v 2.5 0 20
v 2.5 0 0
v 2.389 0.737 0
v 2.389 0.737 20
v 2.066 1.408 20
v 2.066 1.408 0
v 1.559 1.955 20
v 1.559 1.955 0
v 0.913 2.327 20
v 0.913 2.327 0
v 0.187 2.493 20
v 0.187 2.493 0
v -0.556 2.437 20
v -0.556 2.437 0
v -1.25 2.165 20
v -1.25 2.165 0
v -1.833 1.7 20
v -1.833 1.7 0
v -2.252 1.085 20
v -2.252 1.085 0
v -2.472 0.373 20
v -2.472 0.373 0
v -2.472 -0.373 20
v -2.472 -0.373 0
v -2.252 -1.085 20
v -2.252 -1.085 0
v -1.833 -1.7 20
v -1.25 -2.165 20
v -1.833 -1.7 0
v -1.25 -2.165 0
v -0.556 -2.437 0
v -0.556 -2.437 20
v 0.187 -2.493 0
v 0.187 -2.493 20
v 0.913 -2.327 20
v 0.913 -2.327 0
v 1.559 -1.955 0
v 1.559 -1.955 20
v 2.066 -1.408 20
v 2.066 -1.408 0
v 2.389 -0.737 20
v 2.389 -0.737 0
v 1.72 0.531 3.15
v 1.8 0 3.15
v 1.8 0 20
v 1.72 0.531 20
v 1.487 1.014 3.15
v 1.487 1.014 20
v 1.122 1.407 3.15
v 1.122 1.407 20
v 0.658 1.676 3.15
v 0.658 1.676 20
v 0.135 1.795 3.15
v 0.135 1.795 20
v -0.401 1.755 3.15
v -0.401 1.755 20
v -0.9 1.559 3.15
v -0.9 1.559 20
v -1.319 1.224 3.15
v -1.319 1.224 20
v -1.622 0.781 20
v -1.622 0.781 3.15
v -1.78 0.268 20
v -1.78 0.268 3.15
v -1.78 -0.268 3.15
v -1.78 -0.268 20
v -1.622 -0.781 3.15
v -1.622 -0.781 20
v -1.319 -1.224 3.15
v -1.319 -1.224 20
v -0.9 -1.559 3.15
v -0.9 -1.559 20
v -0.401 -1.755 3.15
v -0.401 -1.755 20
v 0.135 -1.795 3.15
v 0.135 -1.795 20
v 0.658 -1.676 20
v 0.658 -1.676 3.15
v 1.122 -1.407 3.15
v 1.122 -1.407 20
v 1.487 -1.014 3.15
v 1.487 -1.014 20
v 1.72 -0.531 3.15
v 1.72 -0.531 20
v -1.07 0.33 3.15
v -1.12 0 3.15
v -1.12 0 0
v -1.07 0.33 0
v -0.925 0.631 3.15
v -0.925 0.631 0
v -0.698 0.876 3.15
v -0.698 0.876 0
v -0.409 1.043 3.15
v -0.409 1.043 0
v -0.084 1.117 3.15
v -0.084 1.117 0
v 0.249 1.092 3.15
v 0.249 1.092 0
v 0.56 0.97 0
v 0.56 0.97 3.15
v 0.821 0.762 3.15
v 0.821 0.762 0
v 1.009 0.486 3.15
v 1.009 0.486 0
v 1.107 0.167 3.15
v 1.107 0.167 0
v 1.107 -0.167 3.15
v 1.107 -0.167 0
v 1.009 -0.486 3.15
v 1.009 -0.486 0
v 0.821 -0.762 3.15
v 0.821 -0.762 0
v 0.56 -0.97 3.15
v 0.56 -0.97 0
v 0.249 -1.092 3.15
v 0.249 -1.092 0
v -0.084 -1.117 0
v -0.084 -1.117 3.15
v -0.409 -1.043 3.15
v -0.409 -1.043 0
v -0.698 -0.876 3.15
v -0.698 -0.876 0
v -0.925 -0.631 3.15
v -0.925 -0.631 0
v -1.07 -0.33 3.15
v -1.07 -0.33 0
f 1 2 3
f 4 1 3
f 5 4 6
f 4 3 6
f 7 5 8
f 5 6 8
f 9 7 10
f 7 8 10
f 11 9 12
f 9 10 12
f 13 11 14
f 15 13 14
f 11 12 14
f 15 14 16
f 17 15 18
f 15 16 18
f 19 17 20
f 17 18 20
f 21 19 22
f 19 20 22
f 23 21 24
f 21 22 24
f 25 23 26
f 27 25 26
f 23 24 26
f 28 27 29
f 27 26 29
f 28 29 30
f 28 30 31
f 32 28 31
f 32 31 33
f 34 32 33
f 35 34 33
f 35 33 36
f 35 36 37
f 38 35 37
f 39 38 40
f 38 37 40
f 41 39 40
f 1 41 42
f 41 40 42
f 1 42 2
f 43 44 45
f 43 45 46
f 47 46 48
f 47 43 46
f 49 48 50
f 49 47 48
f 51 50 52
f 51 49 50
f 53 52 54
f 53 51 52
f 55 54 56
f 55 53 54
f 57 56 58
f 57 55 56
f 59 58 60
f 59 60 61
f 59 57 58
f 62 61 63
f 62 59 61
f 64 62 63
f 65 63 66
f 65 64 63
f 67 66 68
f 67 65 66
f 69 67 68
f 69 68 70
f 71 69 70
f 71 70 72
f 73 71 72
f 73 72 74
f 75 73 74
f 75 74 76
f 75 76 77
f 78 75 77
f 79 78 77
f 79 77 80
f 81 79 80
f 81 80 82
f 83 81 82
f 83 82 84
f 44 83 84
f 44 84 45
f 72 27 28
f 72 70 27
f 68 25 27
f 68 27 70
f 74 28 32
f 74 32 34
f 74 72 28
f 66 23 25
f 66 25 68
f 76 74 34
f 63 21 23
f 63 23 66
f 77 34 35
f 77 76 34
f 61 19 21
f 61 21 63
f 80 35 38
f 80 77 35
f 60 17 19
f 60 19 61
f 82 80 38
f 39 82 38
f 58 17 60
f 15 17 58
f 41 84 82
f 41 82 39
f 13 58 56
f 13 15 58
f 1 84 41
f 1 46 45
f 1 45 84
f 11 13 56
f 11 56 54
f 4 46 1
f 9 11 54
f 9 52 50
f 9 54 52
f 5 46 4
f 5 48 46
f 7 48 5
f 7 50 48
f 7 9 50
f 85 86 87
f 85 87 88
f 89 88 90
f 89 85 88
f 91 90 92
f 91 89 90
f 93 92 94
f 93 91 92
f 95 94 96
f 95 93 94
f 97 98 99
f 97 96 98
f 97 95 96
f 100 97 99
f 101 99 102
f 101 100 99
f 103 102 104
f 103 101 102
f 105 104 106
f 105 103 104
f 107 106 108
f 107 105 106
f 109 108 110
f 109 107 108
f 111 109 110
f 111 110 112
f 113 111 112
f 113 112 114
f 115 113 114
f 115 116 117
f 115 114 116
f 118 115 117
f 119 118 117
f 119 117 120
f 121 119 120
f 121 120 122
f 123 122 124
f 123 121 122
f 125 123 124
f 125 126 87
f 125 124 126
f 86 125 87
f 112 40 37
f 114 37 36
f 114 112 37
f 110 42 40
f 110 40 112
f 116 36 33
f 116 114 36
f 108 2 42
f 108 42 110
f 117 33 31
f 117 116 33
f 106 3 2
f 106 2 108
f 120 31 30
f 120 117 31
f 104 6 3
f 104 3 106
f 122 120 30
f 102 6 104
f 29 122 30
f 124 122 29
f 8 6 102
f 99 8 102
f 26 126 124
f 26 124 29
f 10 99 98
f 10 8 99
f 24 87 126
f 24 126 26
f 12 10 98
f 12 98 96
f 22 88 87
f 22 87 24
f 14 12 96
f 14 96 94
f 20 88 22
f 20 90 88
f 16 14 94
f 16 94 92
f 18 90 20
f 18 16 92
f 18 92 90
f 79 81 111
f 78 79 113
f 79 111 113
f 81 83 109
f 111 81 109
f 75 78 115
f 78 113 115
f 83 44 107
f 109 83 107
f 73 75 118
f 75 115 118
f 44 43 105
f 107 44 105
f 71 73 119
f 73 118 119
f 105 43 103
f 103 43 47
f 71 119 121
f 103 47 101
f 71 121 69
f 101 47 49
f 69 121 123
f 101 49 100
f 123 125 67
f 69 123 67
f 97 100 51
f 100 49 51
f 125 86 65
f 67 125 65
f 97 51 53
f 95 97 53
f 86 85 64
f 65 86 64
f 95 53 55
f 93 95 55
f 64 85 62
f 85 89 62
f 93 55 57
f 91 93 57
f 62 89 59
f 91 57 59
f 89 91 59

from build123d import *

# Parameters (mm, degrees)
CROQUIS1_R                 = 2.5
CROQUIS1_R_2               = 1.8
SALIENTE_EXTRUIR1_DEPTH    = 20
CROQUIS3_R                 = 1.8
SALIENTE_EXTRUIR2_DEPTH    = 3.15
CORTAR_EXTRUIR1_DEPTH      = 21.310096012
CORTAR_EXTRUIR1_DEPTH_BACK = 21.310096012
CROQUIS4_R                 = 1.12


with BuildPart() as part:
    # Croquis1 → Saliente-Extruir1 (new body)
    with BuildSketch(Plane.XY):
        Circle(CROQUIS1_R)
        Circle(CROQUIS1_R_2, mode=Mode.SUBTRACT)
    extrude(amount=SALIENTE_EXTRUIR1_DEPTH)

    # Croquis3 → Saliente-Extruir2 (add)
    with BuildSketch(Plane(origin=(0, 0, 0), x_dir=(-1, 0, 0), z_dir=(0, 0, -1))):
        Circle(CROQUIS3_R)
    extrude(amount=-SALIENTE_EXTRUIR2_DEPTH)

    # Croquis4 → Cortar-Extruir1 (cut, two sides: drawn at the far end of the back side and taken through both)
    with BuildSketch(Plane(origin=(0, 0, 0), x_dir=(-1, 0, 0), z_dir=(0, 0, -1)).offset(-CORTAR_EXTRUIR1_DEPTH_BACK)):
        Circle(CROQUIS4_R)
    extrude(amount=CORTAR_EXTRUIR1_DEPTH + CORTAR_EXTRUIR1_DEPTH_BACK, mode=Mode.SUBTRACT)


solid = part.part
